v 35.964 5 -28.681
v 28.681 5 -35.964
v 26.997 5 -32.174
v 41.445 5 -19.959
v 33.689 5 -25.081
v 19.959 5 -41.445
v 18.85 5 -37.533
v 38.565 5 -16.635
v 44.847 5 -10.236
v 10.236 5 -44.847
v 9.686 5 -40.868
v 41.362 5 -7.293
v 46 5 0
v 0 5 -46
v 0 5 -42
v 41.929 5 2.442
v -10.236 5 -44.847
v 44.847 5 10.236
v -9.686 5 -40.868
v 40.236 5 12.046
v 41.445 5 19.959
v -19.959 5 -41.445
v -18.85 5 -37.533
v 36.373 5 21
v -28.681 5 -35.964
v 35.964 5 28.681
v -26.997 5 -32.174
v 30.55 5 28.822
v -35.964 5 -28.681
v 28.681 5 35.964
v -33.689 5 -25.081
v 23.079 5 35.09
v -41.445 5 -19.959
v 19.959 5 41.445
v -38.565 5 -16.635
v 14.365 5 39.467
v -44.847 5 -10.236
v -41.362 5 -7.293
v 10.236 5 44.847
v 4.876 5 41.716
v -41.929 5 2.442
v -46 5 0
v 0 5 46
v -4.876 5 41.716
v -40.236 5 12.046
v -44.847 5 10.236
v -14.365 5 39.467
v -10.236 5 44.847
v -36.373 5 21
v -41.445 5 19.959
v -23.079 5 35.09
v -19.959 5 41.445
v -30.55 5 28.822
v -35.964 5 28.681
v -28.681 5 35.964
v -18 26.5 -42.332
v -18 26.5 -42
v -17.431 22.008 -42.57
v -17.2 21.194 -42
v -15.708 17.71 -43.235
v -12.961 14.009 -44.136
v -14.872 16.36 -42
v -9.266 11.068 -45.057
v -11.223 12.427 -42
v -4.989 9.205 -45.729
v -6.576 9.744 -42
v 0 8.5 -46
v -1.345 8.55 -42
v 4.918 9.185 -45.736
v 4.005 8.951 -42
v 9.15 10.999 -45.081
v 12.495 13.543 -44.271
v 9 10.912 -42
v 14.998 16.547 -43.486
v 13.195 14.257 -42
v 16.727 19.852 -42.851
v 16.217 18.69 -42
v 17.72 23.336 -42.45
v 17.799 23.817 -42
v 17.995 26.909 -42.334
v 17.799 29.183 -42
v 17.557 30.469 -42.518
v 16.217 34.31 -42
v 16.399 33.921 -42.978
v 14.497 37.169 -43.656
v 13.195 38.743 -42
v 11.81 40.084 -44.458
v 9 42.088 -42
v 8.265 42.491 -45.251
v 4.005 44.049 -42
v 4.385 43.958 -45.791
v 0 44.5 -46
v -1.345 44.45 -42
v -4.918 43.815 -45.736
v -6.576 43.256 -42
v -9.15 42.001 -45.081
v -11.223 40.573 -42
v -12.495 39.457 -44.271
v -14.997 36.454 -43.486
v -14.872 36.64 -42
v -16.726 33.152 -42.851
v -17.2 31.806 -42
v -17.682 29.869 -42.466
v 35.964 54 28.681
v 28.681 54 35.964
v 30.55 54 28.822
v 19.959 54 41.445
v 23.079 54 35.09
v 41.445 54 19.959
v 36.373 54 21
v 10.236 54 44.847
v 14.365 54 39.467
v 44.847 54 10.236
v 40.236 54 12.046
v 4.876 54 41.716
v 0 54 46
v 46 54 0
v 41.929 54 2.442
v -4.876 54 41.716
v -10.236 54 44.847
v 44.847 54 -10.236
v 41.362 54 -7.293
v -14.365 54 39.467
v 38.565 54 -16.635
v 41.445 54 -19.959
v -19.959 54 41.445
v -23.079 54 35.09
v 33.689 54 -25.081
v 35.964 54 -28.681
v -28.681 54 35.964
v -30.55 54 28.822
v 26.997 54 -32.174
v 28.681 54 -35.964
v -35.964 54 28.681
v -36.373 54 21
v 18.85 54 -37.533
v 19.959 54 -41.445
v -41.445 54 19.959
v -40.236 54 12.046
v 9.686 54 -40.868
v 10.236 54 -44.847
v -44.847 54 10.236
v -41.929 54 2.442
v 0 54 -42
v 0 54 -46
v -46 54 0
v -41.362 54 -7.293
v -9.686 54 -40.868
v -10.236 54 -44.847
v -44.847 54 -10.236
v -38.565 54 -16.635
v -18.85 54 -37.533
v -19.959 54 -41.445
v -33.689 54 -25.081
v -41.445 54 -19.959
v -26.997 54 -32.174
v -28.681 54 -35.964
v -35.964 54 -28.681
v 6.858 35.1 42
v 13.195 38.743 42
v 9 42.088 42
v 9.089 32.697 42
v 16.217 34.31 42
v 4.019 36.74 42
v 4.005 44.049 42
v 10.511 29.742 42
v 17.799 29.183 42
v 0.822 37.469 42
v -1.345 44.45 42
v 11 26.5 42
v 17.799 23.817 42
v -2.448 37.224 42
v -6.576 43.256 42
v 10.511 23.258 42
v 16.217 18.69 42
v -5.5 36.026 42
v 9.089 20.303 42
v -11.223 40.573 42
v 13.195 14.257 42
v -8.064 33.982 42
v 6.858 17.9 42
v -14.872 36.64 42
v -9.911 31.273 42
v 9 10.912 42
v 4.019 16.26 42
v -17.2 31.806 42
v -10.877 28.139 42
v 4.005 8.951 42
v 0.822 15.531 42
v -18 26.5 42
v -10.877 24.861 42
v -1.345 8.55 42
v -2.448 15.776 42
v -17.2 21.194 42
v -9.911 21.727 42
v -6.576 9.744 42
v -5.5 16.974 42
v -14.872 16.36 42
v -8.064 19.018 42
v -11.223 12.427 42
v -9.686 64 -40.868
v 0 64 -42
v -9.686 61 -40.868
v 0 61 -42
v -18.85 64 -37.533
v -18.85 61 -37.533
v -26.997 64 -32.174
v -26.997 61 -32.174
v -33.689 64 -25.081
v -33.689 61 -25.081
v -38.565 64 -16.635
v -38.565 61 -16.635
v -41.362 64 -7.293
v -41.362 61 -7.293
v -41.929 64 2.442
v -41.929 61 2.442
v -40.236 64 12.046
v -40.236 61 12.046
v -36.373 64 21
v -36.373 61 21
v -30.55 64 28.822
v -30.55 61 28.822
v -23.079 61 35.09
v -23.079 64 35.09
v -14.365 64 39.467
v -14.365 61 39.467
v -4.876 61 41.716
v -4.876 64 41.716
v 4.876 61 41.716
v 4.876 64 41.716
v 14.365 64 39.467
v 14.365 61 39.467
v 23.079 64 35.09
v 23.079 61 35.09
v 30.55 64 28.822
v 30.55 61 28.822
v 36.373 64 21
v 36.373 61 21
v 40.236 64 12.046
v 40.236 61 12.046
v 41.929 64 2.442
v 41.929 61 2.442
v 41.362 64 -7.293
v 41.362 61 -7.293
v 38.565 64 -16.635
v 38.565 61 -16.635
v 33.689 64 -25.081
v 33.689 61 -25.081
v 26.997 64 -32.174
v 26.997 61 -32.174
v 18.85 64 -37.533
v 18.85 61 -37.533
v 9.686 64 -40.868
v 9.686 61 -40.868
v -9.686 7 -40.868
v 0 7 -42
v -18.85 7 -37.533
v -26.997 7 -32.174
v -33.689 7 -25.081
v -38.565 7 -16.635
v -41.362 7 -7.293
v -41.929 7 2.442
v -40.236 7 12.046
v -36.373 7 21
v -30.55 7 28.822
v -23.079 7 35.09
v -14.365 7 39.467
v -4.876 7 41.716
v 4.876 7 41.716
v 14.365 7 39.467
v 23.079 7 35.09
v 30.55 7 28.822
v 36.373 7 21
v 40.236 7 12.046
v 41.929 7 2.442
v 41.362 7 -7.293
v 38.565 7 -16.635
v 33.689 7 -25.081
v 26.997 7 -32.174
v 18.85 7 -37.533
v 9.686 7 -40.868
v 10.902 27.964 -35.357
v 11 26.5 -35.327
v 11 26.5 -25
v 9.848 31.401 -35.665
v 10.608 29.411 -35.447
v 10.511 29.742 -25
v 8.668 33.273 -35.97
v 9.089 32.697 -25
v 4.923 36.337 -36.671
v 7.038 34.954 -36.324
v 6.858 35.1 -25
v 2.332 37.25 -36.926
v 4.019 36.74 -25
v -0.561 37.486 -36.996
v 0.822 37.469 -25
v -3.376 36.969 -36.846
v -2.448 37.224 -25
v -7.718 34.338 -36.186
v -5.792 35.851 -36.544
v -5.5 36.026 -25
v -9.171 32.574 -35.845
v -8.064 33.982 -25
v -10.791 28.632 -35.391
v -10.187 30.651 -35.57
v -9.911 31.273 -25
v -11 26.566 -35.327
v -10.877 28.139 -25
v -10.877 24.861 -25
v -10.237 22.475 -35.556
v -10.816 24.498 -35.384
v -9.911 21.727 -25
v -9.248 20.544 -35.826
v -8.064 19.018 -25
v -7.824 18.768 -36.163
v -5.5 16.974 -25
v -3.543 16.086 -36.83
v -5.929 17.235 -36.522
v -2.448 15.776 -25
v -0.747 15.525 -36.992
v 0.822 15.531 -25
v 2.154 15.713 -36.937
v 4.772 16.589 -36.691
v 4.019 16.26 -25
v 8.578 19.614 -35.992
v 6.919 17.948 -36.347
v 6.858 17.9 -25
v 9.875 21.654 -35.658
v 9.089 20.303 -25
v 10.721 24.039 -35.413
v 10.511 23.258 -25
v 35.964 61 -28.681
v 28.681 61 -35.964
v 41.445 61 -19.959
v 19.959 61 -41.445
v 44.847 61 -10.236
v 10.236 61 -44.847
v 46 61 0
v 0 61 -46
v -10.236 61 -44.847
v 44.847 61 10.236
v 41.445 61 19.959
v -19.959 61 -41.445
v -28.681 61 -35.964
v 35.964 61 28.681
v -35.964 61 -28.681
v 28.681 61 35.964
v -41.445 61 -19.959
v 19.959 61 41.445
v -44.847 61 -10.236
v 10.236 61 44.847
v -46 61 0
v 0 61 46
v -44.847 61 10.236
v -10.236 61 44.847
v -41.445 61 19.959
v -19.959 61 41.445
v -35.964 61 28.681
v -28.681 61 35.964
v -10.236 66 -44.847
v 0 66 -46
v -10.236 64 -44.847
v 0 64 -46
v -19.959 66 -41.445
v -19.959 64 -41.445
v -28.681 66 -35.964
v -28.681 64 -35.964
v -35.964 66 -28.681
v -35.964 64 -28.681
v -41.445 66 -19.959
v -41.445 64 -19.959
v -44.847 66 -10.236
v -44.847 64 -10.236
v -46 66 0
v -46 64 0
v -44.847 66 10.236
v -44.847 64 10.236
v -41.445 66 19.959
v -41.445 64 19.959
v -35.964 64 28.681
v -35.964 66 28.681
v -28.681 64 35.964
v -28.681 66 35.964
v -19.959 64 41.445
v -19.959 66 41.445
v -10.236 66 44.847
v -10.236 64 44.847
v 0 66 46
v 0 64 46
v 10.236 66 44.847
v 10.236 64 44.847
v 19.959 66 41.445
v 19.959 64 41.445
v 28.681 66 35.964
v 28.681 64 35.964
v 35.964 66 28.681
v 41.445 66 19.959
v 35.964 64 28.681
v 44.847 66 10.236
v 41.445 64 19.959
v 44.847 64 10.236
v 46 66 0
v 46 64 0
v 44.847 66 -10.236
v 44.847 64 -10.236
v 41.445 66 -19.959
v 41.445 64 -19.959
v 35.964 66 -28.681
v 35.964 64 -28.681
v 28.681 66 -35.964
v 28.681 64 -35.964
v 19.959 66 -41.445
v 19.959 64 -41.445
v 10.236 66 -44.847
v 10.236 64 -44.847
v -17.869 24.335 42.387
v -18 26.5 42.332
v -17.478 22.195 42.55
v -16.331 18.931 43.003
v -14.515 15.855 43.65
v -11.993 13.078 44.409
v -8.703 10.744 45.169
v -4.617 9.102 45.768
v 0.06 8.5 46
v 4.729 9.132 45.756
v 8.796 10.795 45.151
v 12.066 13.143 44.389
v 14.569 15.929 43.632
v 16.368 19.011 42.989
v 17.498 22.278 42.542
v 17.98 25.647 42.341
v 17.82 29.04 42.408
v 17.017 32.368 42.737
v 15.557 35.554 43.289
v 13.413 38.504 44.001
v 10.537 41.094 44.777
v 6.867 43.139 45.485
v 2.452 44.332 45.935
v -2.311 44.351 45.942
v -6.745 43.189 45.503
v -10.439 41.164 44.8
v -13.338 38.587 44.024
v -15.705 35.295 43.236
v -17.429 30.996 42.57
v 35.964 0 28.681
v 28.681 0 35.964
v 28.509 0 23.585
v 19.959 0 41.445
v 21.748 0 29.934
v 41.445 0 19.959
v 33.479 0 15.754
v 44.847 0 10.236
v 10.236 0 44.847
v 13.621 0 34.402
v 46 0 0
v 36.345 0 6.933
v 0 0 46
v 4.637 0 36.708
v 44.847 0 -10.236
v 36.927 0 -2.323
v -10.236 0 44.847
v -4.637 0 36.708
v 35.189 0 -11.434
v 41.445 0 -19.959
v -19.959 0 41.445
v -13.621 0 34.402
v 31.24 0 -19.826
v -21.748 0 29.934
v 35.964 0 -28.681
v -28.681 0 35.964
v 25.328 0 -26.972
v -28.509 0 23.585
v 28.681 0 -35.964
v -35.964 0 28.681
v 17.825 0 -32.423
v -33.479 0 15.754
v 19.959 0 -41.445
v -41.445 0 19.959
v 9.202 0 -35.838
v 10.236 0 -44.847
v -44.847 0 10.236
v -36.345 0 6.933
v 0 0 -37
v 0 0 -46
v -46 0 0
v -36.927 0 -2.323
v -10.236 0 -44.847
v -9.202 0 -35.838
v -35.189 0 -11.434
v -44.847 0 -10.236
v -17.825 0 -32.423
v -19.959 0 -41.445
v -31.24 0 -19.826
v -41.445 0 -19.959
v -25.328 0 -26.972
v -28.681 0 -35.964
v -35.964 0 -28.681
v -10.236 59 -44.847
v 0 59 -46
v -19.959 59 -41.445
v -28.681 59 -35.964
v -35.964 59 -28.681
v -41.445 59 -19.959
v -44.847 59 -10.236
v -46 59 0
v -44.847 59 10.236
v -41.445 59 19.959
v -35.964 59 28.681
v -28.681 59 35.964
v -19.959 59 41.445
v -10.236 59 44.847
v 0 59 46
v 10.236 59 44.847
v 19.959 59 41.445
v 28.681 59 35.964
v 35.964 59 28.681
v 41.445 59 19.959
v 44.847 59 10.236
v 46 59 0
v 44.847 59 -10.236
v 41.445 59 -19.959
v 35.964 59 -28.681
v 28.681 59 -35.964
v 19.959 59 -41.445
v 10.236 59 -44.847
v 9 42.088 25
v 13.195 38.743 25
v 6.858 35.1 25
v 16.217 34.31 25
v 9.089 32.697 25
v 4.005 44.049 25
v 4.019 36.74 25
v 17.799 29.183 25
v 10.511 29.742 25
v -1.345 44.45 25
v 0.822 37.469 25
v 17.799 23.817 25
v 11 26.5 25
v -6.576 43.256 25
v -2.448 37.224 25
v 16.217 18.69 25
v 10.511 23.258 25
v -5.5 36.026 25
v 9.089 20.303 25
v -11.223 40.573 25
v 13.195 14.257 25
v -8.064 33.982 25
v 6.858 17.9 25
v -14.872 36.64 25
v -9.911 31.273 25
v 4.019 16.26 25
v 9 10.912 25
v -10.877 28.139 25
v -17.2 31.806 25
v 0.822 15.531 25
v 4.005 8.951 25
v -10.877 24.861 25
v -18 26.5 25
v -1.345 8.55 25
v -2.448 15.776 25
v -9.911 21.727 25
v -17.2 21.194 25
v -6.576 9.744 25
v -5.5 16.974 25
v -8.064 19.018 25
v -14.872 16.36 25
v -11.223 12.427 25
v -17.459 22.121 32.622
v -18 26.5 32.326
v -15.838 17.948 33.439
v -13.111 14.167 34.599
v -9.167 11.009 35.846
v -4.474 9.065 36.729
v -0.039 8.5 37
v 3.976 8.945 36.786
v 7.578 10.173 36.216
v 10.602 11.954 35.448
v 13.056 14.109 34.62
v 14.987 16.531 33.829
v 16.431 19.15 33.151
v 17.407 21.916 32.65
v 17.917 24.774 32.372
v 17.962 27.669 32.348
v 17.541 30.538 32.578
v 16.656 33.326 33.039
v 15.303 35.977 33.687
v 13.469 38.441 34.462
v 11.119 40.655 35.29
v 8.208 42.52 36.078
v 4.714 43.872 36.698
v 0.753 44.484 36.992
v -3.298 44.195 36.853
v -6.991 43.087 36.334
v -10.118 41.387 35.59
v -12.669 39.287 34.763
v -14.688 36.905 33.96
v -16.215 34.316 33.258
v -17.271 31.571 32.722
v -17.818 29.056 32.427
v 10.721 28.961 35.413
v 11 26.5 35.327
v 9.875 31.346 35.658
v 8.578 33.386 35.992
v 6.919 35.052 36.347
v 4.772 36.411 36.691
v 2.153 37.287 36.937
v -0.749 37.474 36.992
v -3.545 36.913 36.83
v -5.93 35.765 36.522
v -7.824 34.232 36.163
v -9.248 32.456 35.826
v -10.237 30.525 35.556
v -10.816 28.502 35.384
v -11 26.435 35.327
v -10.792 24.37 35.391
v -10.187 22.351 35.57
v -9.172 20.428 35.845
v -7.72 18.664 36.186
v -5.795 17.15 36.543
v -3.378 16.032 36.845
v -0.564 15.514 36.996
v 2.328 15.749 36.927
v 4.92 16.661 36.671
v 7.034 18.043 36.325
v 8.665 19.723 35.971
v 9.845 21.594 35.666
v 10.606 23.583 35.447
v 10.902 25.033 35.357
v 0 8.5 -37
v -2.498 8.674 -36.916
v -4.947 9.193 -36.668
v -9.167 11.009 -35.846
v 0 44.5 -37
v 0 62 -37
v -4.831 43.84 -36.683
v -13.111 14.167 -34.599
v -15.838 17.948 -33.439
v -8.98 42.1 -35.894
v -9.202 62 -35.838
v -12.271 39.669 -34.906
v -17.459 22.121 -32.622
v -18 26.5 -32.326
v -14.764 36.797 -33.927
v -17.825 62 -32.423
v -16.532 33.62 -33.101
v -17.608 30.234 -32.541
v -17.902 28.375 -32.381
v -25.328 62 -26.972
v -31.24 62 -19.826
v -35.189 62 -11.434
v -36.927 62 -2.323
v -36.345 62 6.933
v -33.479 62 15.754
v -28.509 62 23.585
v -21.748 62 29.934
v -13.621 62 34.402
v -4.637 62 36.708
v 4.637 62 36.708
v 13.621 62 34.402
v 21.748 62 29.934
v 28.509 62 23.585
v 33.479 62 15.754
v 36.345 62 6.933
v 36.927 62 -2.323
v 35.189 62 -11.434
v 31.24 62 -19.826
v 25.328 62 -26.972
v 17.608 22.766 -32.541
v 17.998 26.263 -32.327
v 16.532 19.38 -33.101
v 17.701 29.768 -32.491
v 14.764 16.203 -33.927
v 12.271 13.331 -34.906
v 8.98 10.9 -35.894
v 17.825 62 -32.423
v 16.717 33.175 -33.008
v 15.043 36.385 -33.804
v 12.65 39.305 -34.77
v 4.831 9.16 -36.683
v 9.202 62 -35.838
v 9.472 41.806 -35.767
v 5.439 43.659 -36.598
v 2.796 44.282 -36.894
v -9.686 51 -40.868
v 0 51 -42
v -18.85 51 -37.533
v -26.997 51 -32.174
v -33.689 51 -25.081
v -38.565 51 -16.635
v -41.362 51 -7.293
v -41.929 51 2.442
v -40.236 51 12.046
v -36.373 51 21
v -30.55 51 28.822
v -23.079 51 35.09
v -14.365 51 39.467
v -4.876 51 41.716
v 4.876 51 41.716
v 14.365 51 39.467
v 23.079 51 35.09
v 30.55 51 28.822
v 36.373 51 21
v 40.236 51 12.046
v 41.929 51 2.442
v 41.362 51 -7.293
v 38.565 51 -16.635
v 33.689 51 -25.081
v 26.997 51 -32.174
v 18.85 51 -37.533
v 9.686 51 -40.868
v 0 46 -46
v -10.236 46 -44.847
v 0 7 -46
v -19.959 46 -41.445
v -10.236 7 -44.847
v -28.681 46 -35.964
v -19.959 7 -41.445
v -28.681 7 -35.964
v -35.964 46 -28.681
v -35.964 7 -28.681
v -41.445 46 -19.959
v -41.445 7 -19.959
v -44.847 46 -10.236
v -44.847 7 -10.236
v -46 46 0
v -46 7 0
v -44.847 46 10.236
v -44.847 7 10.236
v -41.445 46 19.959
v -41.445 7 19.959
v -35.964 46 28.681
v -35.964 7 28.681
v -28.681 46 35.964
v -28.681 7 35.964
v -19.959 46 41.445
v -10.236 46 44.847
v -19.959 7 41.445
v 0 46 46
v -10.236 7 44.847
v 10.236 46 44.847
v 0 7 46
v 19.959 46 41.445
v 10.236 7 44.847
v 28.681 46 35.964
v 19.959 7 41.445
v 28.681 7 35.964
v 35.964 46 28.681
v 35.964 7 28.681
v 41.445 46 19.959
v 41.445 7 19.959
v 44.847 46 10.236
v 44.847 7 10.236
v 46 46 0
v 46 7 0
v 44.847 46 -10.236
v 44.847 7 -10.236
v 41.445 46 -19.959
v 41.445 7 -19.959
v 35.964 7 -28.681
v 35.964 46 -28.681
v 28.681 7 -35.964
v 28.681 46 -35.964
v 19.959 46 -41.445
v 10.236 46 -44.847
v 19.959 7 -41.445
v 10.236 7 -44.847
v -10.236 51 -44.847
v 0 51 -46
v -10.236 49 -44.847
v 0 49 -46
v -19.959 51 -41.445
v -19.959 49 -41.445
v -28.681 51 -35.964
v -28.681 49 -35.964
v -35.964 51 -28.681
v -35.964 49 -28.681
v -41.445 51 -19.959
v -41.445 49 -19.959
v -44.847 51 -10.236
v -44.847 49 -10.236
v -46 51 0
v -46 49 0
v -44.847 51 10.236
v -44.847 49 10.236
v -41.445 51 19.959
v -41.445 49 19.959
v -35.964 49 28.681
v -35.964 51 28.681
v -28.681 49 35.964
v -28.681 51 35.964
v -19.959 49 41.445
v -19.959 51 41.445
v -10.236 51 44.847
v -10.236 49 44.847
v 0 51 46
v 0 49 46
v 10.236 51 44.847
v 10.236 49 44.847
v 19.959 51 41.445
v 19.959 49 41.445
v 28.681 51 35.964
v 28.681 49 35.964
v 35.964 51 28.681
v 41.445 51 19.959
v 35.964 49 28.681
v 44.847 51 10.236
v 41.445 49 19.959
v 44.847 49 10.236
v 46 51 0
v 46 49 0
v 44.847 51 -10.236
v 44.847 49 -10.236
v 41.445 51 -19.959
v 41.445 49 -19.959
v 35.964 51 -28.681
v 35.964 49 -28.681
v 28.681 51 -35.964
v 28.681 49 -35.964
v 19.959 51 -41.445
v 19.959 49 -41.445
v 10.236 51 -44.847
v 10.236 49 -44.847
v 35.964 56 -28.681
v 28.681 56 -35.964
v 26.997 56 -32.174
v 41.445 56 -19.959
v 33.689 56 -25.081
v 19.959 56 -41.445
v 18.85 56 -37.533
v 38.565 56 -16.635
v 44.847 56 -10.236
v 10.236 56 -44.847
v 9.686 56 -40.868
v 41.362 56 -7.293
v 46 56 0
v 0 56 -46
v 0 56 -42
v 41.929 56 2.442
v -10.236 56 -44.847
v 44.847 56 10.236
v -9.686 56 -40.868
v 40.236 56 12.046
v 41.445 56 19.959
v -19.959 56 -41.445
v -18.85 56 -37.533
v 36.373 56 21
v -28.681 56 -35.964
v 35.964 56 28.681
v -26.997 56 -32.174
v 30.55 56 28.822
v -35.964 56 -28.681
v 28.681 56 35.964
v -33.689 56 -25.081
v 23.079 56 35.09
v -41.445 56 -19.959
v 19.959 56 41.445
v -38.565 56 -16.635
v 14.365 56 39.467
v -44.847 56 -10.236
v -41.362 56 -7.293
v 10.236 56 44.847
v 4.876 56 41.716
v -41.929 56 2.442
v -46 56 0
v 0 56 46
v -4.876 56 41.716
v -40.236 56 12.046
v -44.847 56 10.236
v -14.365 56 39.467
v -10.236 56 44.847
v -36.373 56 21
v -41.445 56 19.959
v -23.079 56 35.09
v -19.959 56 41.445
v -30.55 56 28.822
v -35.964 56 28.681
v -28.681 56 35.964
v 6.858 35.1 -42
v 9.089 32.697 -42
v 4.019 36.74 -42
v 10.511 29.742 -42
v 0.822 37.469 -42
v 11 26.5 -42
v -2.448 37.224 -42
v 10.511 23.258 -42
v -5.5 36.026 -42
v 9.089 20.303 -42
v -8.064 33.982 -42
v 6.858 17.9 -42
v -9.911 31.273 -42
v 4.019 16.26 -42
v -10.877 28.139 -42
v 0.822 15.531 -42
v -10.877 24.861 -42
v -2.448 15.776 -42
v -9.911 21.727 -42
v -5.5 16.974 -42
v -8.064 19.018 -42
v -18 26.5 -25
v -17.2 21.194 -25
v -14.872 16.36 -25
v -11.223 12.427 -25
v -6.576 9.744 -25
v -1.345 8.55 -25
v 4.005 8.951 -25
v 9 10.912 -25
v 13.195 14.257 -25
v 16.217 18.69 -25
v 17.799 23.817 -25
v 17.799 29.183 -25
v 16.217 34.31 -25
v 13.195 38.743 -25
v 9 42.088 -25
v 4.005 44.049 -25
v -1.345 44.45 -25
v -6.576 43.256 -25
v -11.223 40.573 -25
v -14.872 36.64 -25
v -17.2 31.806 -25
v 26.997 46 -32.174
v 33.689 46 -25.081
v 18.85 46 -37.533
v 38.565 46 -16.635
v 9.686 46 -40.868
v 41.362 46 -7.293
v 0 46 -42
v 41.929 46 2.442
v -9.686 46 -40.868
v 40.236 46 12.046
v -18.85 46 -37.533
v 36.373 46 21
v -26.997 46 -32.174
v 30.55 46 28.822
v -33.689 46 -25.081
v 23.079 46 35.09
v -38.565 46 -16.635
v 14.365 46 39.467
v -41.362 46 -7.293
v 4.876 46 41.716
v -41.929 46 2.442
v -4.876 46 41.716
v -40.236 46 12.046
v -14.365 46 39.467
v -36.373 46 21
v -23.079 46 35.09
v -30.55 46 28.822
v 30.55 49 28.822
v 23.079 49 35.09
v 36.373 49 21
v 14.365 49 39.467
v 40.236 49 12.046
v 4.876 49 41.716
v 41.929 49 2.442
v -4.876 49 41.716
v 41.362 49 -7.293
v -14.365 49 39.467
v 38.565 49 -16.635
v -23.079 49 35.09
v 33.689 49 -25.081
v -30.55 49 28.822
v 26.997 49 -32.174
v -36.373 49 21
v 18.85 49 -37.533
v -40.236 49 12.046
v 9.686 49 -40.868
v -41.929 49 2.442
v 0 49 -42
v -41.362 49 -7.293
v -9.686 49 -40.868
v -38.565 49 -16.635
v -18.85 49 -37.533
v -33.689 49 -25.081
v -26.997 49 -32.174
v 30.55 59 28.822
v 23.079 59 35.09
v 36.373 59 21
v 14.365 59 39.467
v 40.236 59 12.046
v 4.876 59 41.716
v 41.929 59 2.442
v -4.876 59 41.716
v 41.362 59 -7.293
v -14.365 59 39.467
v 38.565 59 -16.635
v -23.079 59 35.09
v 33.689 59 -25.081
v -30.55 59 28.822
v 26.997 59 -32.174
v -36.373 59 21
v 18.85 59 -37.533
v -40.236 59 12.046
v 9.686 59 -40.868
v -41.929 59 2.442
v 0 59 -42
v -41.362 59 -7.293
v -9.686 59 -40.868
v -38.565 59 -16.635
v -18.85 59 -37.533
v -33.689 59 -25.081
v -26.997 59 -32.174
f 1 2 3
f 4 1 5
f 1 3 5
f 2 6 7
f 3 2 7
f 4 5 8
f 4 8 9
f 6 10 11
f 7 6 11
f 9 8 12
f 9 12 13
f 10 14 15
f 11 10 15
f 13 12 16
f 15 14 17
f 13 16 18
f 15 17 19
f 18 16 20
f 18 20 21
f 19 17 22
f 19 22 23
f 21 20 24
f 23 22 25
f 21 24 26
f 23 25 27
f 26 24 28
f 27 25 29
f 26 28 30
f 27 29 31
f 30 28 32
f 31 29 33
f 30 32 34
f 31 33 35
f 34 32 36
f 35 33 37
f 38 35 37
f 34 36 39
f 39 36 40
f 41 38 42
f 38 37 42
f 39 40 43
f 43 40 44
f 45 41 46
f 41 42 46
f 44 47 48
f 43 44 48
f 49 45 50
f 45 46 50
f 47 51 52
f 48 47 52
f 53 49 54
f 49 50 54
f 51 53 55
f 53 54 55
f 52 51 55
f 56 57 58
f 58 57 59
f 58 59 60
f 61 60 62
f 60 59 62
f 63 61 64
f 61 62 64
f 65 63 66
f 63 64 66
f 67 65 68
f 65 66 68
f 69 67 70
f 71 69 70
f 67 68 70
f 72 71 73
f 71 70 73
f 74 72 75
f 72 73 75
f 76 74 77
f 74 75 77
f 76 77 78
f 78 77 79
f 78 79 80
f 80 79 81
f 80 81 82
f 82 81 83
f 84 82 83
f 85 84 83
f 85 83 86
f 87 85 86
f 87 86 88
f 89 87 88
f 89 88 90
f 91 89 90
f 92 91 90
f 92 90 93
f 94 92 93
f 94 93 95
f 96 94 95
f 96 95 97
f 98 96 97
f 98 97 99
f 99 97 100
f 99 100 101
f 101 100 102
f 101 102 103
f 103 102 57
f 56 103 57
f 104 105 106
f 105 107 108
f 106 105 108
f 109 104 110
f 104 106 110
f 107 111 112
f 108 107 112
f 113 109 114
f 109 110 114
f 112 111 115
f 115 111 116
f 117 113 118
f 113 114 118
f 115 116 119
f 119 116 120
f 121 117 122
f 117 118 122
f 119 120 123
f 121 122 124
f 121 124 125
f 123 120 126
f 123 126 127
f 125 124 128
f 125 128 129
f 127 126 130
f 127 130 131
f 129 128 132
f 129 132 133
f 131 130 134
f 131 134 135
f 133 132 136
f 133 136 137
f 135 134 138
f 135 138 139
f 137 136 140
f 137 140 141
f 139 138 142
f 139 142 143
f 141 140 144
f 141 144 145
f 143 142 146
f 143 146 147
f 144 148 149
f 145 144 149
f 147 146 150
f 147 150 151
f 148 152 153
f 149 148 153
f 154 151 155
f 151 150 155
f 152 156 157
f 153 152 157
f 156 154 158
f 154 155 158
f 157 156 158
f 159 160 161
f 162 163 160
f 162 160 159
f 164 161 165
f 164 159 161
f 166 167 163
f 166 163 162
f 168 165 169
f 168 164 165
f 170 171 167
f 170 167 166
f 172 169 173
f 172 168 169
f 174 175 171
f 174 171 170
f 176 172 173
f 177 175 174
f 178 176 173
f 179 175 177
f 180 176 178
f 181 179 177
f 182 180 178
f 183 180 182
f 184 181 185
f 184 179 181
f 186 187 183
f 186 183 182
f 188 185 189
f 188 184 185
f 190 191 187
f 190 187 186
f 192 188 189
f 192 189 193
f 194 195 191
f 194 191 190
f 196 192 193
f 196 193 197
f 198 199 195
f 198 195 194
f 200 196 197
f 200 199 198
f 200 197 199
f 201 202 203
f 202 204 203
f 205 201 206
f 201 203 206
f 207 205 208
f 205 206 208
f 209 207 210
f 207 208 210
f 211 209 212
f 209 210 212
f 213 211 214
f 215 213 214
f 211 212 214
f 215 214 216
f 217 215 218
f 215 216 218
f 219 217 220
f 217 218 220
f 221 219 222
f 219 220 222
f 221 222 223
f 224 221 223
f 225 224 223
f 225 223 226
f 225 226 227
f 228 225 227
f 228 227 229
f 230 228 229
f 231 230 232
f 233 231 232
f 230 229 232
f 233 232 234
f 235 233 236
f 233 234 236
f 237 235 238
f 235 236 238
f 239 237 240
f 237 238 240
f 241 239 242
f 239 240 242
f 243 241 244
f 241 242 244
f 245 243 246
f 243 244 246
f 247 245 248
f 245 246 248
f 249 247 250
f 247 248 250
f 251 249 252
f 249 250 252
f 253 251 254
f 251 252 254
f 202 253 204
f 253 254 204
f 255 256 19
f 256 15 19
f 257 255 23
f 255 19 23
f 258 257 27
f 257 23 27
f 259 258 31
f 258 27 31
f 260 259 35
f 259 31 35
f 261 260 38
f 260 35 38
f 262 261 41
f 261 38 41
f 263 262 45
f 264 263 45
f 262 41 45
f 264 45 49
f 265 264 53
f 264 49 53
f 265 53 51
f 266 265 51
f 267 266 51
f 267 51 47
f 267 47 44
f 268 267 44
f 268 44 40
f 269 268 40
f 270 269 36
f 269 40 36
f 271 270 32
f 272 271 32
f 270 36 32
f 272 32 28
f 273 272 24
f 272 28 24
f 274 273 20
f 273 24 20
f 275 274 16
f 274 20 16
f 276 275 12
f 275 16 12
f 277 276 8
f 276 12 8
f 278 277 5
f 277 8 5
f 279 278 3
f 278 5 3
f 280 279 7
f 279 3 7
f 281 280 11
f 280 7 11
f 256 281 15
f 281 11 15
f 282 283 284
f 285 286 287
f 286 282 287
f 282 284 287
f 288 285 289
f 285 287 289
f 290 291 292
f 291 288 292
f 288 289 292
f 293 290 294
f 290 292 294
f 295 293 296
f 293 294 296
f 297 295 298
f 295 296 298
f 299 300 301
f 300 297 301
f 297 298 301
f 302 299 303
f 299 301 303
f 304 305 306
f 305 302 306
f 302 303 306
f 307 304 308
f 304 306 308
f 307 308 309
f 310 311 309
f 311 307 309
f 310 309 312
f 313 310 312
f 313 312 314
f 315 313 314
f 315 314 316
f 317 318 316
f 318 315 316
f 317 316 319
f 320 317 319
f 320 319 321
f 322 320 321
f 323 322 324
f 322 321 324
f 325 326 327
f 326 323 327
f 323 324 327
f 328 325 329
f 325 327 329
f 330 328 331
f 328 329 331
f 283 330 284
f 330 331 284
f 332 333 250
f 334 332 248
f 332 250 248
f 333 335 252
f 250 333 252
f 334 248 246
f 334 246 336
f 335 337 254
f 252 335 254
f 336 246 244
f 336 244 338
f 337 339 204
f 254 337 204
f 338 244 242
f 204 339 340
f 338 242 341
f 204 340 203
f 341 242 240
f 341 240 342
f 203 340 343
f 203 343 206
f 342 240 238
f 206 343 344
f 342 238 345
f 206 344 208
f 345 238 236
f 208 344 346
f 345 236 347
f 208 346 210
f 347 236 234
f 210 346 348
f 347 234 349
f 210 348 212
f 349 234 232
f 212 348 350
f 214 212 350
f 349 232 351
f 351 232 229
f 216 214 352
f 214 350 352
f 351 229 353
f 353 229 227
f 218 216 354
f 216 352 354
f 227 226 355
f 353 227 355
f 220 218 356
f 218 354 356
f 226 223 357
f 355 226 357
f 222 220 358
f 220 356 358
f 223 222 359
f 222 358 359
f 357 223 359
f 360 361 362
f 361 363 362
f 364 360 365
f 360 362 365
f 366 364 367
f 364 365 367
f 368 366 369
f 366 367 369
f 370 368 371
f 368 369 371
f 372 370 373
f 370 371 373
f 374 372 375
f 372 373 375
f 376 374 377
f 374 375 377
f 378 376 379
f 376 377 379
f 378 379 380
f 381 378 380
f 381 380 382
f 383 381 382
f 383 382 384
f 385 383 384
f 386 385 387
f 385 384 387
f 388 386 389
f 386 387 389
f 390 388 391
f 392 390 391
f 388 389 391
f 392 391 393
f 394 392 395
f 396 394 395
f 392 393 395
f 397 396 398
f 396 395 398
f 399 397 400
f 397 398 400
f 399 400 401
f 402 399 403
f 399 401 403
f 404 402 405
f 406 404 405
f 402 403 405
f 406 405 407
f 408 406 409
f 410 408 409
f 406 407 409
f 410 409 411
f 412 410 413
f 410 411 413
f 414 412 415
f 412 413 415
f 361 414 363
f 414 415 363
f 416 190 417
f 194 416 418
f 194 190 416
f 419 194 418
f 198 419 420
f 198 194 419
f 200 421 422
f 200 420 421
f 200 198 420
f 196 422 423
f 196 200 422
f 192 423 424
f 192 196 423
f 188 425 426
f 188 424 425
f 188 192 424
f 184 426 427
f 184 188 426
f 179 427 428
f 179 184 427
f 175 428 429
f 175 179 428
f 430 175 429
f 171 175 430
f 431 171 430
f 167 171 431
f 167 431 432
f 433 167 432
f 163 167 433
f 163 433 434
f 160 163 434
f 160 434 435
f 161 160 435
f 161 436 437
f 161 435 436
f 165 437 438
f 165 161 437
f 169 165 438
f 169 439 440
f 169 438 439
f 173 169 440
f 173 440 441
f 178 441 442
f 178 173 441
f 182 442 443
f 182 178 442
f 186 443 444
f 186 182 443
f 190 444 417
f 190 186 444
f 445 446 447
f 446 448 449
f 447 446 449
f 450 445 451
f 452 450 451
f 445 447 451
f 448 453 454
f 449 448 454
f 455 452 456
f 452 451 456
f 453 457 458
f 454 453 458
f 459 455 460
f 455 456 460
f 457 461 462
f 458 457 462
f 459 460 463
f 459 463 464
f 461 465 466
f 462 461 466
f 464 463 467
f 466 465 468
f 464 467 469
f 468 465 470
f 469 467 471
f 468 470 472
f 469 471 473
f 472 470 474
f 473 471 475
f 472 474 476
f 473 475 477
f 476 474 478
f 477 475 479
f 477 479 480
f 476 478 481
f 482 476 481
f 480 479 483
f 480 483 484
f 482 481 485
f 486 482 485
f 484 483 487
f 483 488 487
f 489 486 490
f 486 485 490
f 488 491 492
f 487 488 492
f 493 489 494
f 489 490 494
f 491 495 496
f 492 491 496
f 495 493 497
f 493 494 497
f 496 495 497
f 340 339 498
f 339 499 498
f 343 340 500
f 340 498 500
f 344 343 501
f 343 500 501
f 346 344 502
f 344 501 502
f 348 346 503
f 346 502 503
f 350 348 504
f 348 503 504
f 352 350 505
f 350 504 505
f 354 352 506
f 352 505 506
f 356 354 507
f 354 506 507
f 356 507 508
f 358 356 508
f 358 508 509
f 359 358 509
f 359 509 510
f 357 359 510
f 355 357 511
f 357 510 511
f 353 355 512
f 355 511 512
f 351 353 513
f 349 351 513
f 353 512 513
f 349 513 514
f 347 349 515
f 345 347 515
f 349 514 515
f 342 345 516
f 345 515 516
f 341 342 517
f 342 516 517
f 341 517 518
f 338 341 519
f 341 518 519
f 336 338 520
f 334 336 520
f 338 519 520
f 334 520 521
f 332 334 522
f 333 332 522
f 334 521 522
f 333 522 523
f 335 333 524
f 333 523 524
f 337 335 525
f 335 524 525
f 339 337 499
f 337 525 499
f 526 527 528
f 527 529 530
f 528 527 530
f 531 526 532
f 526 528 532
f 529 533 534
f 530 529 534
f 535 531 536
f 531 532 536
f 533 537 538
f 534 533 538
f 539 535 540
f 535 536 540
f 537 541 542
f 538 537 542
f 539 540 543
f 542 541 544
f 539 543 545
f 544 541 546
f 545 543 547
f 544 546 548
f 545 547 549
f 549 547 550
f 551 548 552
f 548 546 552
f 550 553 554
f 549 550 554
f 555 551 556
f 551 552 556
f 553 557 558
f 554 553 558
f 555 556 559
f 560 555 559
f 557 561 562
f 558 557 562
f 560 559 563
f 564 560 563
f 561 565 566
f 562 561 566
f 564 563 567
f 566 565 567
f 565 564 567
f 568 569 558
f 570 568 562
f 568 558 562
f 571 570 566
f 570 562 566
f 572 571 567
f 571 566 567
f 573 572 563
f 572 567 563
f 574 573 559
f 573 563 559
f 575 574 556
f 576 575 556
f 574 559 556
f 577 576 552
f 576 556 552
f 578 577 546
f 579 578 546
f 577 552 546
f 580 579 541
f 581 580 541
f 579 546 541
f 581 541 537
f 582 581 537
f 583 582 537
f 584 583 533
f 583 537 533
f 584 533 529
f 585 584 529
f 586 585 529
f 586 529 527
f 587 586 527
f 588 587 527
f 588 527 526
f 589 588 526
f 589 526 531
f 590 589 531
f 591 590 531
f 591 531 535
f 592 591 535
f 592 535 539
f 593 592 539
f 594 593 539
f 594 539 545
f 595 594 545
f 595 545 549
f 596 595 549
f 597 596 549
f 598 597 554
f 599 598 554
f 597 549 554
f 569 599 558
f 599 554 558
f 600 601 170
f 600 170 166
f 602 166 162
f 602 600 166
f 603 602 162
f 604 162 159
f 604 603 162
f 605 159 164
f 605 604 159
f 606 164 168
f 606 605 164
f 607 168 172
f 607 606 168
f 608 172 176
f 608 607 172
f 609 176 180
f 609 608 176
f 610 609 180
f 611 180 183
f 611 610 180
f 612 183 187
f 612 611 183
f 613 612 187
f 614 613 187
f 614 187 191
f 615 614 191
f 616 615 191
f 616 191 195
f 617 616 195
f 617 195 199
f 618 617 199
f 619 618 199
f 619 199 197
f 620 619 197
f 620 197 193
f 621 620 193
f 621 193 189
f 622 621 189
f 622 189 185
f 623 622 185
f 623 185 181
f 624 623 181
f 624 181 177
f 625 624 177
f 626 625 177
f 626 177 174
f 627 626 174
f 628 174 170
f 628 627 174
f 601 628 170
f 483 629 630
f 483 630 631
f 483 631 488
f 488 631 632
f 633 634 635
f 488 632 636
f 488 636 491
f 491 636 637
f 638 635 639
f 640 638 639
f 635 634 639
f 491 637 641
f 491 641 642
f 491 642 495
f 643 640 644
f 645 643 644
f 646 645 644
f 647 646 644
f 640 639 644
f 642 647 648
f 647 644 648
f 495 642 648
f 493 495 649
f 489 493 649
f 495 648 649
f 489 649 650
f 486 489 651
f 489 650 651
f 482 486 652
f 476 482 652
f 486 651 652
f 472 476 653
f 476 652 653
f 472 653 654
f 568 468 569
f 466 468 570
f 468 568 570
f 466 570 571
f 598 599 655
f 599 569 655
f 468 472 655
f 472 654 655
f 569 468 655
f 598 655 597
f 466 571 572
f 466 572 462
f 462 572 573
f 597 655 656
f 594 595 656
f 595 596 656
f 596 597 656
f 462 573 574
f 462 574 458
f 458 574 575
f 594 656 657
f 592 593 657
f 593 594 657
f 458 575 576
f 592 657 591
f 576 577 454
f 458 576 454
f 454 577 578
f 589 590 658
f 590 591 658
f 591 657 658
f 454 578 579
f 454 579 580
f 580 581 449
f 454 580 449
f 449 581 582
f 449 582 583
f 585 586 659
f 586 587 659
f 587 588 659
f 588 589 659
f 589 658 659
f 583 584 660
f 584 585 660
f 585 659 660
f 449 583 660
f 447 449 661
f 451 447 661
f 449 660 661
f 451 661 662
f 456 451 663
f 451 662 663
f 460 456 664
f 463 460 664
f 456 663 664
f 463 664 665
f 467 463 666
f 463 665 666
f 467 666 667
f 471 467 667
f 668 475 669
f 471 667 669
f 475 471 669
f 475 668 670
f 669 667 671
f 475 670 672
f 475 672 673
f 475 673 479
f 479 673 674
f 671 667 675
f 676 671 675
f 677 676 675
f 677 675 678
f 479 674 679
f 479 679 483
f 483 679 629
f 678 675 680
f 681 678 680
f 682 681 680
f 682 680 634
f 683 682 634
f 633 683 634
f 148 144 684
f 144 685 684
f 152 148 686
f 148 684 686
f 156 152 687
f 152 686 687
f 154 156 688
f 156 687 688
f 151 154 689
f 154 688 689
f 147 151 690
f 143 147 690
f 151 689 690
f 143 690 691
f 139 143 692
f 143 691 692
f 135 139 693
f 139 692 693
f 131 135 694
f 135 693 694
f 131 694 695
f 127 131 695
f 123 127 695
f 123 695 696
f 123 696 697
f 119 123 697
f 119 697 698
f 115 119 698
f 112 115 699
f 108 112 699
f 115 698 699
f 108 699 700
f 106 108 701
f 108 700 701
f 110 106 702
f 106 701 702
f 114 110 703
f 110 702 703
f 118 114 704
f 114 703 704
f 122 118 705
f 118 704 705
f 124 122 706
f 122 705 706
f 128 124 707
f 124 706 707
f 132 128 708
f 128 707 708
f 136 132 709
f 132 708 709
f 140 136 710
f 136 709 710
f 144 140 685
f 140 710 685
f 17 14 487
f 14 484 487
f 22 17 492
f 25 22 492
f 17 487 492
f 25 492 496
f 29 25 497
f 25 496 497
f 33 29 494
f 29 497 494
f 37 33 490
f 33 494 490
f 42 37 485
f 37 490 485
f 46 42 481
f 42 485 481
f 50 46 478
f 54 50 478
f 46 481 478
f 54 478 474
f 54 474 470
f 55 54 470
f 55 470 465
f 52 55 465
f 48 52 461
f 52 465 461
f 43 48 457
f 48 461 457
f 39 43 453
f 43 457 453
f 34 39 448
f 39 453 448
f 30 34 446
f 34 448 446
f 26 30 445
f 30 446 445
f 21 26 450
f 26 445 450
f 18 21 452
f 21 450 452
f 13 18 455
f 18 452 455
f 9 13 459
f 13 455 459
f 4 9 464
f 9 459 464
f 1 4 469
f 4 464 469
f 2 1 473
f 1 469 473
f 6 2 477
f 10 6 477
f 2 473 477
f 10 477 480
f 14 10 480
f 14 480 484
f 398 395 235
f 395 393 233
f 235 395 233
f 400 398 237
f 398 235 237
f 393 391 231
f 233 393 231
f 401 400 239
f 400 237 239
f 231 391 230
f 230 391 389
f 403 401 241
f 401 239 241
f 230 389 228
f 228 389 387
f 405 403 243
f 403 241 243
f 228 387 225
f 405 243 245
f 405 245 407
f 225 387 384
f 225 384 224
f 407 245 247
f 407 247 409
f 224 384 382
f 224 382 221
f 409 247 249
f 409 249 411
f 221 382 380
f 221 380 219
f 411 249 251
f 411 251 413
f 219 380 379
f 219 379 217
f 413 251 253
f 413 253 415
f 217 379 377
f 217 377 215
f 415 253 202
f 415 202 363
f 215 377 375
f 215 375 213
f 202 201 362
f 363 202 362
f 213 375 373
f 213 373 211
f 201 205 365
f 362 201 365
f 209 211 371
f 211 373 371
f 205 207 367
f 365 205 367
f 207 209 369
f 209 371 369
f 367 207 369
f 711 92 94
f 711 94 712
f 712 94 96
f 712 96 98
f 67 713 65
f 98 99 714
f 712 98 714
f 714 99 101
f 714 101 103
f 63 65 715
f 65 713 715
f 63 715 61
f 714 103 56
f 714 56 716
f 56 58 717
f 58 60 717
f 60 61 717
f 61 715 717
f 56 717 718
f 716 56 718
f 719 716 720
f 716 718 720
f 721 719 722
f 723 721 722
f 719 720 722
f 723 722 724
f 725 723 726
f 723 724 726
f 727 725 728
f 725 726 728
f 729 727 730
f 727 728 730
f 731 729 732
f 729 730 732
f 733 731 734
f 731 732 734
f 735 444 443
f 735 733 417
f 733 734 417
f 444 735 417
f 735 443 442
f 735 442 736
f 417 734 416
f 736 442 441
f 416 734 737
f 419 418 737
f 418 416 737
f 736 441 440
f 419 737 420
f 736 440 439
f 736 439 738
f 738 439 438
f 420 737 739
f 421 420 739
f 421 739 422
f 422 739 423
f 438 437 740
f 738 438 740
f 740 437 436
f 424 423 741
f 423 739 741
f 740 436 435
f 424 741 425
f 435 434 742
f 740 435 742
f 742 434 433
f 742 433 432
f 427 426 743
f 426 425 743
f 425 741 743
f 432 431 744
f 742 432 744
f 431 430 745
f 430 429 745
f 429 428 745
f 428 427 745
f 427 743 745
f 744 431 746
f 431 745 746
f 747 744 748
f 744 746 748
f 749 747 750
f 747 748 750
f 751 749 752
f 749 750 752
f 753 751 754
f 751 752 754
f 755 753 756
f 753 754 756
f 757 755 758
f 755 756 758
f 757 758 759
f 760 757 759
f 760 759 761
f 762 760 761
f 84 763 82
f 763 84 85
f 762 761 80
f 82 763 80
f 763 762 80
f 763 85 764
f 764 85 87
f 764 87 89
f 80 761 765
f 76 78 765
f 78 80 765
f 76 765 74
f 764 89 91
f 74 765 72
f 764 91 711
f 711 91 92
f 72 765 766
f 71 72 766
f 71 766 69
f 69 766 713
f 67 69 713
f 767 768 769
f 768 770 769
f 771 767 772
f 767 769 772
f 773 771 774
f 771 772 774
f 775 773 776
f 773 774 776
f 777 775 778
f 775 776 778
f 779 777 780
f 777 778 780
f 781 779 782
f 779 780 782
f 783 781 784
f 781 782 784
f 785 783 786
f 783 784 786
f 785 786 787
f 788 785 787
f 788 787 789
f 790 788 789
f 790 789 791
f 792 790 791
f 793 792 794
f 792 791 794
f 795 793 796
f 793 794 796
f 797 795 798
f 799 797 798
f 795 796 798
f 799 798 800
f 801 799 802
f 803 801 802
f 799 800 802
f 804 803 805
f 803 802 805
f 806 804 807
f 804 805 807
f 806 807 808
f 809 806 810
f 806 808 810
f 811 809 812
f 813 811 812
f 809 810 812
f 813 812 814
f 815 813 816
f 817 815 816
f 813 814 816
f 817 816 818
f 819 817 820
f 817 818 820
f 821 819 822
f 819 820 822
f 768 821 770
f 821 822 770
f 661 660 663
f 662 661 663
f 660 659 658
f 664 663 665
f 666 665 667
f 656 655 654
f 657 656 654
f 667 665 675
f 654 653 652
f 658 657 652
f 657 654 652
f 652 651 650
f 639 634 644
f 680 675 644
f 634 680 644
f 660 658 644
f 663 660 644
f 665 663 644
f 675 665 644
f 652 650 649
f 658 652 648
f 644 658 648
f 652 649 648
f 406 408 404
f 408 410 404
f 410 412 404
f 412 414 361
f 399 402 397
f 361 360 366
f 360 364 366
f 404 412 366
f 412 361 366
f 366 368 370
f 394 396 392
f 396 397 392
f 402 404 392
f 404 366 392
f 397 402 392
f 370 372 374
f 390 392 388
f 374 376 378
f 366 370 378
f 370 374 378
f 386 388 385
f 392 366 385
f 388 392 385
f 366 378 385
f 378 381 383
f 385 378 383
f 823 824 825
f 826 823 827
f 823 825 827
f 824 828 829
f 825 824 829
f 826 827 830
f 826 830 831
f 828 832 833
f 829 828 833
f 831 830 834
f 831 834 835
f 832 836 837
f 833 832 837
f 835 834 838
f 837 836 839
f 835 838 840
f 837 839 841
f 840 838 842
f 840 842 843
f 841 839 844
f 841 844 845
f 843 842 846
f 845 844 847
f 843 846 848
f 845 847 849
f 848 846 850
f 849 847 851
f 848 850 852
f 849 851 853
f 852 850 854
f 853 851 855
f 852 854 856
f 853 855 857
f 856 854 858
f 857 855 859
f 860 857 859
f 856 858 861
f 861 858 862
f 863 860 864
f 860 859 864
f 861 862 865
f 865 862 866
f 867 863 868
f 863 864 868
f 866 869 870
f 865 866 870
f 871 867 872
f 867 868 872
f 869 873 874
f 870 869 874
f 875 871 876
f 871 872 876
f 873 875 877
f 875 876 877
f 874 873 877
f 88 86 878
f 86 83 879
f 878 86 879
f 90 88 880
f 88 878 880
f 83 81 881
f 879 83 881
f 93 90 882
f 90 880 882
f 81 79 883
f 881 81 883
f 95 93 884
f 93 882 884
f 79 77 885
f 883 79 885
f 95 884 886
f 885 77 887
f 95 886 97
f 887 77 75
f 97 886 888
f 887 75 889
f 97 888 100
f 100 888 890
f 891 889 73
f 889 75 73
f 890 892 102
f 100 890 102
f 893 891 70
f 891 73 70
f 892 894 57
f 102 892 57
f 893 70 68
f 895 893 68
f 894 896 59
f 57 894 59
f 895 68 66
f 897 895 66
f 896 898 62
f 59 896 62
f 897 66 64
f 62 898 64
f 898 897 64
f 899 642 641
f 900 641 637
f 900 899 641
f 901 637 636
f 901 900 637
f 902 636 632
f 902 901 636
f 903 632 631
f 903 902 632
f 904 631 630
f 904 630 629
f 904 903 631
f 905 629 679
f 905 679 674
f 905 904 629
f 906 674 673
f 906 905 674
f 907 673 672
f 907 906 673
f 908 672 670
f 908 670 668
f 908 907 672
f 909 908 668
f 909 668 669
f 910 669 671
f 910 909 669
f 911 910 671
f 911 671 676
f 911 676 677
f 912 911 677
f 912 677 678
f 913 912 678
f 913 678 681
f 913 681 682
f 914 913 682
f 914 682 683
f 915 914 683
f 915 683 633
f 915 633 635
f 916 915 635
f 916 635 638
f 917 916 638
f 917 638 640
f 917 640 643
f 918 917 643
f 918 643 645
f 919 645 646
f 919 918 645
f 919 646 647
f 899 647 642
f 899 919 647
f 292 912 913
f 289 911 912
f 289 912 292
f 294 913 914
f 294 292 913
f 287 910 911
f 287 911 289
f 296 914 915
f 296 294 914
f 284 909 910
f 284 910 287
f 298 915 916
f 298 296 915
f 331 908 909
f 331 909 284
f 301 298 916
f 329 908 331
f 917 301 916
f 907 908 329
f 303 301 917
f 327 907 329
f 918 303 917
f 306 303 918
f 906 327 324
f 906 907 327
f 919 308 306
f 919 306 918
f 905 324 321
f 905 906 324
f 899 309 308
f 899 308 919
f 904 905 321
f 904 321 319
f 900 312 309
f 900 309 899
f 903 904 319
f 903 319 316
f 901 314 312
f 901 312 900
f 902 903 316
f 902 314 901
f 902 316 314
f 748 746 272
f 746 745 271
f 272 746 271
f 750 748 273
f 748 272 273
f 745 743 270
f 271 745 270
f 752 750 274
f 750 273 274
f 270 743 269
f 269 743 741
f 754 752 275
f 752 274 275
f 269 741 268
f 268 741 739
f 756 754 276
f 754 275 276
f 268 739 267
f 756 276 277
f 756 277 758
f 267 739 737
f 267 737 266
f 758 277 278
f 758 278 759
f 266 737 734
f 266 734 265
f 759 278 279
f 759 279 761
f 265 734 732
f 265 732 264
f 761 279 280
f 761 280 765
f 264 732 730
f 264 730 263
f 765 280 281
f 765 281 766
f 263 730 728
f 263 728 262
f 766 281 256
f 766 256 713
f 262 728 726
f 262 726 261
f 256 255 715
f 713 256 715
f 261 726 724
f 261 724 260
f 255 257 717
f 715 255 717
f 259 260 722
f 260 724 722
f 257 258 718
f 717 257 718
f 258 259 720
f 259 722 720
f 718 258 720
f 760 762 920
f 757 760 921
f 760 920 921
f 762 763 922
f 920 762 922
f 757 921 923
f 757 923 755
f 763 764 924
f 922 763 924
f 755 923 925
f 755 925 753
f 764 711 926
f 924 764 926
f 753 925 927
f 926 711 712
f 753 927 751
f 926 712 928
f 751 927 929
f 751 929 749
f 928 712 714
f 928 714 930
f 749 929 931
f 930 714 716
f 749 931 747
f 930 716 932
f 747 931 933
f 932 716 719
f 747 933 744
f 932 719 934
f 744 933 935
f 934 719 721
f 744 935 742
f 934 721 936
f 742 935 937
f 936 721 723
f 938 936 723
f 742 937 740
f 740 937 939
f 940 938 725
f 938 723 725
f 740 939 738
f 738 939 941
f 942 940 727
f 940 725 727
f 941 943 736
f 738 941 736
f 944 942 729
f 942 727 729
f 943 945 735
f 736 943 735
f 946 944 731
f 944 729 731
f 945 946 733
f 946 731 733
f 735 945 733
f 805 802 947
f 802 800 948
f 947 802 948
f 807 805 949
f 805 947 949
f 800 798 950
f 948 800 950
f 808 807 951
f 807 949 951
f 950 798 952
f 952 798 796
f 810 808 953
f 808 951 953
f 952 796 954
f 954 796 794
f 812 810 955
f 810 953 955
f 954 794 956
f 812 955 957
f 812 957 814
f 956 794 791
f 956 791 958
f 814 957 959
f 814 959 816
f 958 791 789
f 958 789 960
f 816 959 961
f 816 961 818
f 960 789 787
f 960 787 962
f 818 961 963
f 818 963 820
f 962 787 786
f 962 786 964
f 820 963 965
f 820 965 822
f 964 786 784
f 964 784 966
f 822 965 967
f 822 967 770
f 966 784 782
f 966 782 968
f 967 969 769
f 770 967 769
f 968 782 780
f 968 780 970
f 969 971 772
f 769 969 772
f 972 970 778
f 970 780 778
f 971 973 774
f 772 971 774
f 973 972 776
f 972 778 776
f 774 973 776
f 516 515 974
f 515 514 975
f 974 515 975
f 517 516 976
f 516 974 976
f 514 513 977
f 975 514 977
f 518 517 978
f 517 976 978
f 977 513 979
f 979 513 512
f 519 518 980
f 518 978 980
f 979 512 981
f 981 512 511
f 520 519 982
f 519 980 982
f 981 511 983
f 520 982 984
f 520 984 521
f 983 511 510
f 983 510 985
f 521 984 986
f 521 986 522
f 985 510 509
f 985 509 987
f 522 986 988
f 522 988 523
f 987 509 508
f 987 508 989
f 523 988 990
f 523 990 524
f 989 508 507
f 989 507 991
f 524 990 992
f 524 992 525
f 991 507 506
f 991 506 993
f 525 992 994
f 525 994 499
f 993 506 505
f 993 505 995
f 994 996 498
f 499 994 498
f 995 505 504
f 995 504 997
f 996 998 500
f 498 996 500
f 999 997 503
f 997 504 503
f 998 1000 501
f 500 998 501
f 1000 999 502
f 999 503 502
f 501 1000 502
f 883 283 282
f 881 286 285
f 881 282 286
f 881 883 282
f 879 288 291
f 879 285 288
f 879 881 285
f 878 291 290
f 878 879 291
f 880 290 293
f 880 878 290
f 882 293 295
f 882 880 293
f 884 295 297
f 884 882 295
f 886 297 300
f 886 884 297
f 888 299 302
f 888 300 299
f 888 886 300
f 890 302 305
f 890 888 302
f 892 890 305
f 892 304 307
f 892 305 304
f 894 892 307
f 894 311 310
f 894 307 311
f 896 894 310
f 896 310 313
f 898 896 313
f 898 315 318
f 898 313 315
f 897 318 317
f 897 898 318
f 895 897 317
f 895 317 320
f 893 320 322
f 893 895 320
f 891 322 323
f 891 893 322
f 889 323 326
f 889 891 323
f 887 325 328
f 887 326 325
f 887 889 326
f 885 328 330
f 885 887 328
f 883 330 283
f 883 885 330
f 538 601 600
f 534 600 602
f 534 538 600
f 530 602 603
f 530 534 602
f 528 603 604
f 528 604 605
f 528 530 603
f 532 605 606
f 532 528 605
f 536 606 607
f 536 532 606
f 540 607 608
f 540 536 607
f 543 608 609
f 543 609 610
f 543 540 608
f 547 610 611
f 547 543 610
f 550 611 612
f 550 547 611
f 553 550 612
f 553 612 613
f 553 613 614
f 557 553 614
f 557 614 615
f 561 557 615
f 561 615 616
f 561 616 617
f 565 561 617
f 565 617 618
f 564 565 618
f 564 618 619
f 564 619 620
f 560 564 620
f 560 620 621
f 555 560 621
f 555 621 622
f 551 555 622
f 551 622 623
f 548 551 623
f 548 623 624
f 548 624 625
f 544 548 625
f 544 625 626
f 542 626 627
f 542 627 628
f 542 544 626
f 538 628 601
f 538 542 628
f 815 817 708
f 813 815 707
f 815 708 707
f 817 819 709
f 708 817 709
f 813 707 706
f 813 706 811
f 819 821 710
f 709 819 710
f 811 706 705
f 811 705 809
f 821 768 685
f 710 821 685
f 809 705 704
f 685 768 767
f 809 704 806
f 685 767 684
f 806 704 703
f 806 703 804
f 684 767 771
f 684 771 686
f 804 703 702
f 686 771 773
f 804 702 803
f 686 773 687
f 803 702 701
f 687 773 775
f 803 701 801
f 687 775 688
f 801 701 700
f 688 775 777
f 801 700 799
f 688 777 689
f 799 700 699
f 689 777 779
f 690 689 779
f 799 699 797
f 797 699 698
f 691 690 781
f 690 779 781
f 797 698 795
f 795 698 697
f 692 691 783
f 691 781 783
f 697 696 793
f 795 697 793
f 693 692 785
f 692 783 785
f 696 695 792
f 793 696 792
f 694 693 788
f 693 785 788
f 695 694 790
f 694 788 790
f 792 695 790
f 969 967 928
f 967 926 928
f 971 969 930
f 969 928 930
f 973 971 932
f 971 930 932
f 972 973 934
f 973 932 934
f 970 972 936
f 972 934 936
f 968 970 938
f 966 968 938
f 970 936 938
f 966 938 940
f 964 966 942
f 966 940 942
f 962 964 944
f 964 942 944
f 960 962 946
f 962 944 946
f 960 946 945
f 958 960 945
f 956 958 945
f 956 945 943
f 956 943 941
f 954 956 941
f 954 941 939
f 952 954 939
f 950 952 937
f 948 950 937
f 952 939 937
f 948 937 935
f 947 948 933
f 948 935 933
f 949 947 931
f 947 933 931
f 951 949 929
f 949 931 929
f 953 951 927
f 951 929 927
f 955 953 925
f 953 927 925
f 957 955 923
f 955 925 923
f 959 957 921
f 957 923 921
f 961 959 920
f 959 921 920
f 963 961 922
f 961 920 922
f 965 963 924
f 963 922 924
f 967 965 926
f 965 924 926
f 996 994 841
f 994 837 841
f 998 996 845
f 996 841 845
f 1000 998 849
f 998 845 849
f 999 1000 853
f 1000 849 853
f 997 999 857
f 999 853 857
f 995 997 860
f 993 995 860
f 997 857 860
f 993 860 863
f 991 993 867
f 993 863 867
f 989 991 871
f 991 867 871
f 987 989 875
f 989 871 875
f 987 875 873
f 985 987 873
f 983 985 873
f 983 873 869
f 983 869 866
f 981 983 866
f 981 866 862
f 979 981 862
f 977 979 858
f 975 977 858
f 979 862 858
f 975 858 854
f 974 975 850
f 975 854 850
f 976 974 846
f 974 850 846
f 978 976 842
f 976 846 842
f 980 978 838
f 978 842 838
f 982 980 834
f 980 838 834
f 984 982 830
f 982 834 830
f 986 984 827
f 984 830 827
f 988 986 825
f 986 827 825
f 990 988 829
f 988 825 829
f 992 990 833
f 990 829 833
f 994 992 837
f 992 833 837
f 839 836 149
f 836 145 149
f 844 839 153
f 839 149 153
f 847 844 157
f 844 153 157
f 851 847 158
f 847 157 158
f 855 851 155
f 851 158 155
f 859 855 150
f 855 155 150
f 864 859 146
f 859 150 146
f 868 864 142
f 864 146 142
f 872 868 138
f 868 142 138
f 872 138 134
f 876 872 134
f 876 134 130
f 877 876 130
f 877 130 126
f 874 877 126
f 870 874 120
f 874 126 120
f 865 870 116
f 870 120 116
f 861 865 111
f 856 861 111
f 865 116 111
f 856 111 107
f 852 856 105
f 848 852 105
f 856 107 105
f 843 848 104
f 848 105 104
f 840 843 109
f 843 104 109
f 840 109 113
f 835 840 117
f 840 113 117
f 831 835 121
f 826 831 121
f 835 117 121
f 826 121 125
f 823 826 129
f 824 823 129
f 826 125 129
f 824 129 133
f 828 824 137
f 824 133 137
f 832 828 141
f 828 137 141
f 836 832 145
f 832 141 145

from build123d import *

# Parameters (mm, degrees)
CUT_EXTRUDE1_DEPTH       = 93.671462706
CUT_EXTRUDE1_DEPTH_BACK  = 93.671462706
SKETCH2_R                = 11
BOSS_EXTRUDE1_REACH      = 119.671
BOSS_EXTRUDE1_END_RADIUS = 37
BOSS_EXTRUDE1_START      = 25
SKETCH2_3_R              = 18
SKETCH2_3_R_2            = 11
CUT_EXTRUDE3_START       = 42
SKETCH2_5_R              = 18
SKETCH2_5_R_2            = 11
CUT_EXTRUDE3_DEPTH       = 4


with BuildPart() as part:
    # Sketch1 → Revolve1 (revolve)
    with BuildSketch(Plane.XY, mode=Mode.PRIVATE) as revolve1_sk:
        Polygon((0, 66), (46, 66), (46, 64), (42, 64), (42, 61), (46, 61), (46, 59), (42, 59), (42, 56), (46, 56), (46, 54), (42, 54), (42, 51), (46, 51), (46, 49), (42, 49), (42, 46), (46, 46), (46, 7), (42, 7), (42, 5), (46, 5), (46, 0), (37, 0), (37, 62), (0, 62), align=None)
    revolve(revolve1_sk.sketch.rotate(Axis((0, 0, 0), (0, 1, 0)), 90), axis=Axis((0, 0, 0), (0, 1, 0)))

    # Sketch2 → Cut-Extrude1 (cut, two sides: drawn at the far end of the back side and taken through both)
    with BuildSketch(Plane.XY.offset(-CUT_EXTRUDE1_DEPTH_BACK)):
        with Locations((0, 26.5)):
            Circle(SKETCH2_R)
    extrude(amount=CUT_EXTRUDE1_DEPTH + CUT_EXTRUDE1_DEPTH_BACK, mode=Mode.SUBTRACT)

    # Boss-Extrude1: up to this cylinder (the profile starts inside it)
    boss_extrude1_end = Plane(origin=(0, 26.5, 0), z_dir=(0, -1, 0)) * Cylinder(BOSS_EXTRUDE1_END_RADIUS, 314.342, mode=Mode.PRIVATE)
    # Sketch2<3> → Boss-Extrude1 (add, up to the surface)
    with BuildSketch(Plane.XY.offset(BOSS_EXTRUDE1_START), mode=Mode.PRIVATE) as boss_extrude1_sk1:
        with Locations(Location((0, 26.5, 0), (0, 0, 180))):
            Circle(SKETCH2_3_R)
        with Locations((0, 26.5)):
            Circle(SKETCH2_3_R_2, mode=Mode.SUBTRACT)
    boss_extrude1_tool1 = extrude(boss_extrude1_sk1.sketch, amount=BOSS_EXTRUDE1_REACH, mode=Mode.PRIVATE) & boss_extrude1_end
    boss_extrude1 = boss_extrude1_tool1.solids().sort_by_distance((17.490883, 26.5, 25))[0]
    add(boss_extrude1)

    # Sketch2<5> → Cut-Extrude3 (cut)
    with BuildSketch(Plane.XY.offset(CUT_EXTRUDE3_START)):
        with Locations(Location((0, 26.5, 0), (0, 0, 180))):
            Circle(SKETCH2_5_R)
        with Locations((0, 26.5)):
            Circle(SKETCH2_5_R_2, mode=Mode.SUBTRACT)
    cut_extrude3 = extrude(amount=CUT_EXTRUDE3_DEPTH, mode=Mode.SUBTRACT)

    # Mirror1: Boss-Extrude1, Cut-Extrude3 across plane
    add(boss_extrude1.mirror(Plane.XY))
    add(cut_extrude3.mirror(Plane.XY), mode=Mode.SUBTRACT)


solid = part.part
